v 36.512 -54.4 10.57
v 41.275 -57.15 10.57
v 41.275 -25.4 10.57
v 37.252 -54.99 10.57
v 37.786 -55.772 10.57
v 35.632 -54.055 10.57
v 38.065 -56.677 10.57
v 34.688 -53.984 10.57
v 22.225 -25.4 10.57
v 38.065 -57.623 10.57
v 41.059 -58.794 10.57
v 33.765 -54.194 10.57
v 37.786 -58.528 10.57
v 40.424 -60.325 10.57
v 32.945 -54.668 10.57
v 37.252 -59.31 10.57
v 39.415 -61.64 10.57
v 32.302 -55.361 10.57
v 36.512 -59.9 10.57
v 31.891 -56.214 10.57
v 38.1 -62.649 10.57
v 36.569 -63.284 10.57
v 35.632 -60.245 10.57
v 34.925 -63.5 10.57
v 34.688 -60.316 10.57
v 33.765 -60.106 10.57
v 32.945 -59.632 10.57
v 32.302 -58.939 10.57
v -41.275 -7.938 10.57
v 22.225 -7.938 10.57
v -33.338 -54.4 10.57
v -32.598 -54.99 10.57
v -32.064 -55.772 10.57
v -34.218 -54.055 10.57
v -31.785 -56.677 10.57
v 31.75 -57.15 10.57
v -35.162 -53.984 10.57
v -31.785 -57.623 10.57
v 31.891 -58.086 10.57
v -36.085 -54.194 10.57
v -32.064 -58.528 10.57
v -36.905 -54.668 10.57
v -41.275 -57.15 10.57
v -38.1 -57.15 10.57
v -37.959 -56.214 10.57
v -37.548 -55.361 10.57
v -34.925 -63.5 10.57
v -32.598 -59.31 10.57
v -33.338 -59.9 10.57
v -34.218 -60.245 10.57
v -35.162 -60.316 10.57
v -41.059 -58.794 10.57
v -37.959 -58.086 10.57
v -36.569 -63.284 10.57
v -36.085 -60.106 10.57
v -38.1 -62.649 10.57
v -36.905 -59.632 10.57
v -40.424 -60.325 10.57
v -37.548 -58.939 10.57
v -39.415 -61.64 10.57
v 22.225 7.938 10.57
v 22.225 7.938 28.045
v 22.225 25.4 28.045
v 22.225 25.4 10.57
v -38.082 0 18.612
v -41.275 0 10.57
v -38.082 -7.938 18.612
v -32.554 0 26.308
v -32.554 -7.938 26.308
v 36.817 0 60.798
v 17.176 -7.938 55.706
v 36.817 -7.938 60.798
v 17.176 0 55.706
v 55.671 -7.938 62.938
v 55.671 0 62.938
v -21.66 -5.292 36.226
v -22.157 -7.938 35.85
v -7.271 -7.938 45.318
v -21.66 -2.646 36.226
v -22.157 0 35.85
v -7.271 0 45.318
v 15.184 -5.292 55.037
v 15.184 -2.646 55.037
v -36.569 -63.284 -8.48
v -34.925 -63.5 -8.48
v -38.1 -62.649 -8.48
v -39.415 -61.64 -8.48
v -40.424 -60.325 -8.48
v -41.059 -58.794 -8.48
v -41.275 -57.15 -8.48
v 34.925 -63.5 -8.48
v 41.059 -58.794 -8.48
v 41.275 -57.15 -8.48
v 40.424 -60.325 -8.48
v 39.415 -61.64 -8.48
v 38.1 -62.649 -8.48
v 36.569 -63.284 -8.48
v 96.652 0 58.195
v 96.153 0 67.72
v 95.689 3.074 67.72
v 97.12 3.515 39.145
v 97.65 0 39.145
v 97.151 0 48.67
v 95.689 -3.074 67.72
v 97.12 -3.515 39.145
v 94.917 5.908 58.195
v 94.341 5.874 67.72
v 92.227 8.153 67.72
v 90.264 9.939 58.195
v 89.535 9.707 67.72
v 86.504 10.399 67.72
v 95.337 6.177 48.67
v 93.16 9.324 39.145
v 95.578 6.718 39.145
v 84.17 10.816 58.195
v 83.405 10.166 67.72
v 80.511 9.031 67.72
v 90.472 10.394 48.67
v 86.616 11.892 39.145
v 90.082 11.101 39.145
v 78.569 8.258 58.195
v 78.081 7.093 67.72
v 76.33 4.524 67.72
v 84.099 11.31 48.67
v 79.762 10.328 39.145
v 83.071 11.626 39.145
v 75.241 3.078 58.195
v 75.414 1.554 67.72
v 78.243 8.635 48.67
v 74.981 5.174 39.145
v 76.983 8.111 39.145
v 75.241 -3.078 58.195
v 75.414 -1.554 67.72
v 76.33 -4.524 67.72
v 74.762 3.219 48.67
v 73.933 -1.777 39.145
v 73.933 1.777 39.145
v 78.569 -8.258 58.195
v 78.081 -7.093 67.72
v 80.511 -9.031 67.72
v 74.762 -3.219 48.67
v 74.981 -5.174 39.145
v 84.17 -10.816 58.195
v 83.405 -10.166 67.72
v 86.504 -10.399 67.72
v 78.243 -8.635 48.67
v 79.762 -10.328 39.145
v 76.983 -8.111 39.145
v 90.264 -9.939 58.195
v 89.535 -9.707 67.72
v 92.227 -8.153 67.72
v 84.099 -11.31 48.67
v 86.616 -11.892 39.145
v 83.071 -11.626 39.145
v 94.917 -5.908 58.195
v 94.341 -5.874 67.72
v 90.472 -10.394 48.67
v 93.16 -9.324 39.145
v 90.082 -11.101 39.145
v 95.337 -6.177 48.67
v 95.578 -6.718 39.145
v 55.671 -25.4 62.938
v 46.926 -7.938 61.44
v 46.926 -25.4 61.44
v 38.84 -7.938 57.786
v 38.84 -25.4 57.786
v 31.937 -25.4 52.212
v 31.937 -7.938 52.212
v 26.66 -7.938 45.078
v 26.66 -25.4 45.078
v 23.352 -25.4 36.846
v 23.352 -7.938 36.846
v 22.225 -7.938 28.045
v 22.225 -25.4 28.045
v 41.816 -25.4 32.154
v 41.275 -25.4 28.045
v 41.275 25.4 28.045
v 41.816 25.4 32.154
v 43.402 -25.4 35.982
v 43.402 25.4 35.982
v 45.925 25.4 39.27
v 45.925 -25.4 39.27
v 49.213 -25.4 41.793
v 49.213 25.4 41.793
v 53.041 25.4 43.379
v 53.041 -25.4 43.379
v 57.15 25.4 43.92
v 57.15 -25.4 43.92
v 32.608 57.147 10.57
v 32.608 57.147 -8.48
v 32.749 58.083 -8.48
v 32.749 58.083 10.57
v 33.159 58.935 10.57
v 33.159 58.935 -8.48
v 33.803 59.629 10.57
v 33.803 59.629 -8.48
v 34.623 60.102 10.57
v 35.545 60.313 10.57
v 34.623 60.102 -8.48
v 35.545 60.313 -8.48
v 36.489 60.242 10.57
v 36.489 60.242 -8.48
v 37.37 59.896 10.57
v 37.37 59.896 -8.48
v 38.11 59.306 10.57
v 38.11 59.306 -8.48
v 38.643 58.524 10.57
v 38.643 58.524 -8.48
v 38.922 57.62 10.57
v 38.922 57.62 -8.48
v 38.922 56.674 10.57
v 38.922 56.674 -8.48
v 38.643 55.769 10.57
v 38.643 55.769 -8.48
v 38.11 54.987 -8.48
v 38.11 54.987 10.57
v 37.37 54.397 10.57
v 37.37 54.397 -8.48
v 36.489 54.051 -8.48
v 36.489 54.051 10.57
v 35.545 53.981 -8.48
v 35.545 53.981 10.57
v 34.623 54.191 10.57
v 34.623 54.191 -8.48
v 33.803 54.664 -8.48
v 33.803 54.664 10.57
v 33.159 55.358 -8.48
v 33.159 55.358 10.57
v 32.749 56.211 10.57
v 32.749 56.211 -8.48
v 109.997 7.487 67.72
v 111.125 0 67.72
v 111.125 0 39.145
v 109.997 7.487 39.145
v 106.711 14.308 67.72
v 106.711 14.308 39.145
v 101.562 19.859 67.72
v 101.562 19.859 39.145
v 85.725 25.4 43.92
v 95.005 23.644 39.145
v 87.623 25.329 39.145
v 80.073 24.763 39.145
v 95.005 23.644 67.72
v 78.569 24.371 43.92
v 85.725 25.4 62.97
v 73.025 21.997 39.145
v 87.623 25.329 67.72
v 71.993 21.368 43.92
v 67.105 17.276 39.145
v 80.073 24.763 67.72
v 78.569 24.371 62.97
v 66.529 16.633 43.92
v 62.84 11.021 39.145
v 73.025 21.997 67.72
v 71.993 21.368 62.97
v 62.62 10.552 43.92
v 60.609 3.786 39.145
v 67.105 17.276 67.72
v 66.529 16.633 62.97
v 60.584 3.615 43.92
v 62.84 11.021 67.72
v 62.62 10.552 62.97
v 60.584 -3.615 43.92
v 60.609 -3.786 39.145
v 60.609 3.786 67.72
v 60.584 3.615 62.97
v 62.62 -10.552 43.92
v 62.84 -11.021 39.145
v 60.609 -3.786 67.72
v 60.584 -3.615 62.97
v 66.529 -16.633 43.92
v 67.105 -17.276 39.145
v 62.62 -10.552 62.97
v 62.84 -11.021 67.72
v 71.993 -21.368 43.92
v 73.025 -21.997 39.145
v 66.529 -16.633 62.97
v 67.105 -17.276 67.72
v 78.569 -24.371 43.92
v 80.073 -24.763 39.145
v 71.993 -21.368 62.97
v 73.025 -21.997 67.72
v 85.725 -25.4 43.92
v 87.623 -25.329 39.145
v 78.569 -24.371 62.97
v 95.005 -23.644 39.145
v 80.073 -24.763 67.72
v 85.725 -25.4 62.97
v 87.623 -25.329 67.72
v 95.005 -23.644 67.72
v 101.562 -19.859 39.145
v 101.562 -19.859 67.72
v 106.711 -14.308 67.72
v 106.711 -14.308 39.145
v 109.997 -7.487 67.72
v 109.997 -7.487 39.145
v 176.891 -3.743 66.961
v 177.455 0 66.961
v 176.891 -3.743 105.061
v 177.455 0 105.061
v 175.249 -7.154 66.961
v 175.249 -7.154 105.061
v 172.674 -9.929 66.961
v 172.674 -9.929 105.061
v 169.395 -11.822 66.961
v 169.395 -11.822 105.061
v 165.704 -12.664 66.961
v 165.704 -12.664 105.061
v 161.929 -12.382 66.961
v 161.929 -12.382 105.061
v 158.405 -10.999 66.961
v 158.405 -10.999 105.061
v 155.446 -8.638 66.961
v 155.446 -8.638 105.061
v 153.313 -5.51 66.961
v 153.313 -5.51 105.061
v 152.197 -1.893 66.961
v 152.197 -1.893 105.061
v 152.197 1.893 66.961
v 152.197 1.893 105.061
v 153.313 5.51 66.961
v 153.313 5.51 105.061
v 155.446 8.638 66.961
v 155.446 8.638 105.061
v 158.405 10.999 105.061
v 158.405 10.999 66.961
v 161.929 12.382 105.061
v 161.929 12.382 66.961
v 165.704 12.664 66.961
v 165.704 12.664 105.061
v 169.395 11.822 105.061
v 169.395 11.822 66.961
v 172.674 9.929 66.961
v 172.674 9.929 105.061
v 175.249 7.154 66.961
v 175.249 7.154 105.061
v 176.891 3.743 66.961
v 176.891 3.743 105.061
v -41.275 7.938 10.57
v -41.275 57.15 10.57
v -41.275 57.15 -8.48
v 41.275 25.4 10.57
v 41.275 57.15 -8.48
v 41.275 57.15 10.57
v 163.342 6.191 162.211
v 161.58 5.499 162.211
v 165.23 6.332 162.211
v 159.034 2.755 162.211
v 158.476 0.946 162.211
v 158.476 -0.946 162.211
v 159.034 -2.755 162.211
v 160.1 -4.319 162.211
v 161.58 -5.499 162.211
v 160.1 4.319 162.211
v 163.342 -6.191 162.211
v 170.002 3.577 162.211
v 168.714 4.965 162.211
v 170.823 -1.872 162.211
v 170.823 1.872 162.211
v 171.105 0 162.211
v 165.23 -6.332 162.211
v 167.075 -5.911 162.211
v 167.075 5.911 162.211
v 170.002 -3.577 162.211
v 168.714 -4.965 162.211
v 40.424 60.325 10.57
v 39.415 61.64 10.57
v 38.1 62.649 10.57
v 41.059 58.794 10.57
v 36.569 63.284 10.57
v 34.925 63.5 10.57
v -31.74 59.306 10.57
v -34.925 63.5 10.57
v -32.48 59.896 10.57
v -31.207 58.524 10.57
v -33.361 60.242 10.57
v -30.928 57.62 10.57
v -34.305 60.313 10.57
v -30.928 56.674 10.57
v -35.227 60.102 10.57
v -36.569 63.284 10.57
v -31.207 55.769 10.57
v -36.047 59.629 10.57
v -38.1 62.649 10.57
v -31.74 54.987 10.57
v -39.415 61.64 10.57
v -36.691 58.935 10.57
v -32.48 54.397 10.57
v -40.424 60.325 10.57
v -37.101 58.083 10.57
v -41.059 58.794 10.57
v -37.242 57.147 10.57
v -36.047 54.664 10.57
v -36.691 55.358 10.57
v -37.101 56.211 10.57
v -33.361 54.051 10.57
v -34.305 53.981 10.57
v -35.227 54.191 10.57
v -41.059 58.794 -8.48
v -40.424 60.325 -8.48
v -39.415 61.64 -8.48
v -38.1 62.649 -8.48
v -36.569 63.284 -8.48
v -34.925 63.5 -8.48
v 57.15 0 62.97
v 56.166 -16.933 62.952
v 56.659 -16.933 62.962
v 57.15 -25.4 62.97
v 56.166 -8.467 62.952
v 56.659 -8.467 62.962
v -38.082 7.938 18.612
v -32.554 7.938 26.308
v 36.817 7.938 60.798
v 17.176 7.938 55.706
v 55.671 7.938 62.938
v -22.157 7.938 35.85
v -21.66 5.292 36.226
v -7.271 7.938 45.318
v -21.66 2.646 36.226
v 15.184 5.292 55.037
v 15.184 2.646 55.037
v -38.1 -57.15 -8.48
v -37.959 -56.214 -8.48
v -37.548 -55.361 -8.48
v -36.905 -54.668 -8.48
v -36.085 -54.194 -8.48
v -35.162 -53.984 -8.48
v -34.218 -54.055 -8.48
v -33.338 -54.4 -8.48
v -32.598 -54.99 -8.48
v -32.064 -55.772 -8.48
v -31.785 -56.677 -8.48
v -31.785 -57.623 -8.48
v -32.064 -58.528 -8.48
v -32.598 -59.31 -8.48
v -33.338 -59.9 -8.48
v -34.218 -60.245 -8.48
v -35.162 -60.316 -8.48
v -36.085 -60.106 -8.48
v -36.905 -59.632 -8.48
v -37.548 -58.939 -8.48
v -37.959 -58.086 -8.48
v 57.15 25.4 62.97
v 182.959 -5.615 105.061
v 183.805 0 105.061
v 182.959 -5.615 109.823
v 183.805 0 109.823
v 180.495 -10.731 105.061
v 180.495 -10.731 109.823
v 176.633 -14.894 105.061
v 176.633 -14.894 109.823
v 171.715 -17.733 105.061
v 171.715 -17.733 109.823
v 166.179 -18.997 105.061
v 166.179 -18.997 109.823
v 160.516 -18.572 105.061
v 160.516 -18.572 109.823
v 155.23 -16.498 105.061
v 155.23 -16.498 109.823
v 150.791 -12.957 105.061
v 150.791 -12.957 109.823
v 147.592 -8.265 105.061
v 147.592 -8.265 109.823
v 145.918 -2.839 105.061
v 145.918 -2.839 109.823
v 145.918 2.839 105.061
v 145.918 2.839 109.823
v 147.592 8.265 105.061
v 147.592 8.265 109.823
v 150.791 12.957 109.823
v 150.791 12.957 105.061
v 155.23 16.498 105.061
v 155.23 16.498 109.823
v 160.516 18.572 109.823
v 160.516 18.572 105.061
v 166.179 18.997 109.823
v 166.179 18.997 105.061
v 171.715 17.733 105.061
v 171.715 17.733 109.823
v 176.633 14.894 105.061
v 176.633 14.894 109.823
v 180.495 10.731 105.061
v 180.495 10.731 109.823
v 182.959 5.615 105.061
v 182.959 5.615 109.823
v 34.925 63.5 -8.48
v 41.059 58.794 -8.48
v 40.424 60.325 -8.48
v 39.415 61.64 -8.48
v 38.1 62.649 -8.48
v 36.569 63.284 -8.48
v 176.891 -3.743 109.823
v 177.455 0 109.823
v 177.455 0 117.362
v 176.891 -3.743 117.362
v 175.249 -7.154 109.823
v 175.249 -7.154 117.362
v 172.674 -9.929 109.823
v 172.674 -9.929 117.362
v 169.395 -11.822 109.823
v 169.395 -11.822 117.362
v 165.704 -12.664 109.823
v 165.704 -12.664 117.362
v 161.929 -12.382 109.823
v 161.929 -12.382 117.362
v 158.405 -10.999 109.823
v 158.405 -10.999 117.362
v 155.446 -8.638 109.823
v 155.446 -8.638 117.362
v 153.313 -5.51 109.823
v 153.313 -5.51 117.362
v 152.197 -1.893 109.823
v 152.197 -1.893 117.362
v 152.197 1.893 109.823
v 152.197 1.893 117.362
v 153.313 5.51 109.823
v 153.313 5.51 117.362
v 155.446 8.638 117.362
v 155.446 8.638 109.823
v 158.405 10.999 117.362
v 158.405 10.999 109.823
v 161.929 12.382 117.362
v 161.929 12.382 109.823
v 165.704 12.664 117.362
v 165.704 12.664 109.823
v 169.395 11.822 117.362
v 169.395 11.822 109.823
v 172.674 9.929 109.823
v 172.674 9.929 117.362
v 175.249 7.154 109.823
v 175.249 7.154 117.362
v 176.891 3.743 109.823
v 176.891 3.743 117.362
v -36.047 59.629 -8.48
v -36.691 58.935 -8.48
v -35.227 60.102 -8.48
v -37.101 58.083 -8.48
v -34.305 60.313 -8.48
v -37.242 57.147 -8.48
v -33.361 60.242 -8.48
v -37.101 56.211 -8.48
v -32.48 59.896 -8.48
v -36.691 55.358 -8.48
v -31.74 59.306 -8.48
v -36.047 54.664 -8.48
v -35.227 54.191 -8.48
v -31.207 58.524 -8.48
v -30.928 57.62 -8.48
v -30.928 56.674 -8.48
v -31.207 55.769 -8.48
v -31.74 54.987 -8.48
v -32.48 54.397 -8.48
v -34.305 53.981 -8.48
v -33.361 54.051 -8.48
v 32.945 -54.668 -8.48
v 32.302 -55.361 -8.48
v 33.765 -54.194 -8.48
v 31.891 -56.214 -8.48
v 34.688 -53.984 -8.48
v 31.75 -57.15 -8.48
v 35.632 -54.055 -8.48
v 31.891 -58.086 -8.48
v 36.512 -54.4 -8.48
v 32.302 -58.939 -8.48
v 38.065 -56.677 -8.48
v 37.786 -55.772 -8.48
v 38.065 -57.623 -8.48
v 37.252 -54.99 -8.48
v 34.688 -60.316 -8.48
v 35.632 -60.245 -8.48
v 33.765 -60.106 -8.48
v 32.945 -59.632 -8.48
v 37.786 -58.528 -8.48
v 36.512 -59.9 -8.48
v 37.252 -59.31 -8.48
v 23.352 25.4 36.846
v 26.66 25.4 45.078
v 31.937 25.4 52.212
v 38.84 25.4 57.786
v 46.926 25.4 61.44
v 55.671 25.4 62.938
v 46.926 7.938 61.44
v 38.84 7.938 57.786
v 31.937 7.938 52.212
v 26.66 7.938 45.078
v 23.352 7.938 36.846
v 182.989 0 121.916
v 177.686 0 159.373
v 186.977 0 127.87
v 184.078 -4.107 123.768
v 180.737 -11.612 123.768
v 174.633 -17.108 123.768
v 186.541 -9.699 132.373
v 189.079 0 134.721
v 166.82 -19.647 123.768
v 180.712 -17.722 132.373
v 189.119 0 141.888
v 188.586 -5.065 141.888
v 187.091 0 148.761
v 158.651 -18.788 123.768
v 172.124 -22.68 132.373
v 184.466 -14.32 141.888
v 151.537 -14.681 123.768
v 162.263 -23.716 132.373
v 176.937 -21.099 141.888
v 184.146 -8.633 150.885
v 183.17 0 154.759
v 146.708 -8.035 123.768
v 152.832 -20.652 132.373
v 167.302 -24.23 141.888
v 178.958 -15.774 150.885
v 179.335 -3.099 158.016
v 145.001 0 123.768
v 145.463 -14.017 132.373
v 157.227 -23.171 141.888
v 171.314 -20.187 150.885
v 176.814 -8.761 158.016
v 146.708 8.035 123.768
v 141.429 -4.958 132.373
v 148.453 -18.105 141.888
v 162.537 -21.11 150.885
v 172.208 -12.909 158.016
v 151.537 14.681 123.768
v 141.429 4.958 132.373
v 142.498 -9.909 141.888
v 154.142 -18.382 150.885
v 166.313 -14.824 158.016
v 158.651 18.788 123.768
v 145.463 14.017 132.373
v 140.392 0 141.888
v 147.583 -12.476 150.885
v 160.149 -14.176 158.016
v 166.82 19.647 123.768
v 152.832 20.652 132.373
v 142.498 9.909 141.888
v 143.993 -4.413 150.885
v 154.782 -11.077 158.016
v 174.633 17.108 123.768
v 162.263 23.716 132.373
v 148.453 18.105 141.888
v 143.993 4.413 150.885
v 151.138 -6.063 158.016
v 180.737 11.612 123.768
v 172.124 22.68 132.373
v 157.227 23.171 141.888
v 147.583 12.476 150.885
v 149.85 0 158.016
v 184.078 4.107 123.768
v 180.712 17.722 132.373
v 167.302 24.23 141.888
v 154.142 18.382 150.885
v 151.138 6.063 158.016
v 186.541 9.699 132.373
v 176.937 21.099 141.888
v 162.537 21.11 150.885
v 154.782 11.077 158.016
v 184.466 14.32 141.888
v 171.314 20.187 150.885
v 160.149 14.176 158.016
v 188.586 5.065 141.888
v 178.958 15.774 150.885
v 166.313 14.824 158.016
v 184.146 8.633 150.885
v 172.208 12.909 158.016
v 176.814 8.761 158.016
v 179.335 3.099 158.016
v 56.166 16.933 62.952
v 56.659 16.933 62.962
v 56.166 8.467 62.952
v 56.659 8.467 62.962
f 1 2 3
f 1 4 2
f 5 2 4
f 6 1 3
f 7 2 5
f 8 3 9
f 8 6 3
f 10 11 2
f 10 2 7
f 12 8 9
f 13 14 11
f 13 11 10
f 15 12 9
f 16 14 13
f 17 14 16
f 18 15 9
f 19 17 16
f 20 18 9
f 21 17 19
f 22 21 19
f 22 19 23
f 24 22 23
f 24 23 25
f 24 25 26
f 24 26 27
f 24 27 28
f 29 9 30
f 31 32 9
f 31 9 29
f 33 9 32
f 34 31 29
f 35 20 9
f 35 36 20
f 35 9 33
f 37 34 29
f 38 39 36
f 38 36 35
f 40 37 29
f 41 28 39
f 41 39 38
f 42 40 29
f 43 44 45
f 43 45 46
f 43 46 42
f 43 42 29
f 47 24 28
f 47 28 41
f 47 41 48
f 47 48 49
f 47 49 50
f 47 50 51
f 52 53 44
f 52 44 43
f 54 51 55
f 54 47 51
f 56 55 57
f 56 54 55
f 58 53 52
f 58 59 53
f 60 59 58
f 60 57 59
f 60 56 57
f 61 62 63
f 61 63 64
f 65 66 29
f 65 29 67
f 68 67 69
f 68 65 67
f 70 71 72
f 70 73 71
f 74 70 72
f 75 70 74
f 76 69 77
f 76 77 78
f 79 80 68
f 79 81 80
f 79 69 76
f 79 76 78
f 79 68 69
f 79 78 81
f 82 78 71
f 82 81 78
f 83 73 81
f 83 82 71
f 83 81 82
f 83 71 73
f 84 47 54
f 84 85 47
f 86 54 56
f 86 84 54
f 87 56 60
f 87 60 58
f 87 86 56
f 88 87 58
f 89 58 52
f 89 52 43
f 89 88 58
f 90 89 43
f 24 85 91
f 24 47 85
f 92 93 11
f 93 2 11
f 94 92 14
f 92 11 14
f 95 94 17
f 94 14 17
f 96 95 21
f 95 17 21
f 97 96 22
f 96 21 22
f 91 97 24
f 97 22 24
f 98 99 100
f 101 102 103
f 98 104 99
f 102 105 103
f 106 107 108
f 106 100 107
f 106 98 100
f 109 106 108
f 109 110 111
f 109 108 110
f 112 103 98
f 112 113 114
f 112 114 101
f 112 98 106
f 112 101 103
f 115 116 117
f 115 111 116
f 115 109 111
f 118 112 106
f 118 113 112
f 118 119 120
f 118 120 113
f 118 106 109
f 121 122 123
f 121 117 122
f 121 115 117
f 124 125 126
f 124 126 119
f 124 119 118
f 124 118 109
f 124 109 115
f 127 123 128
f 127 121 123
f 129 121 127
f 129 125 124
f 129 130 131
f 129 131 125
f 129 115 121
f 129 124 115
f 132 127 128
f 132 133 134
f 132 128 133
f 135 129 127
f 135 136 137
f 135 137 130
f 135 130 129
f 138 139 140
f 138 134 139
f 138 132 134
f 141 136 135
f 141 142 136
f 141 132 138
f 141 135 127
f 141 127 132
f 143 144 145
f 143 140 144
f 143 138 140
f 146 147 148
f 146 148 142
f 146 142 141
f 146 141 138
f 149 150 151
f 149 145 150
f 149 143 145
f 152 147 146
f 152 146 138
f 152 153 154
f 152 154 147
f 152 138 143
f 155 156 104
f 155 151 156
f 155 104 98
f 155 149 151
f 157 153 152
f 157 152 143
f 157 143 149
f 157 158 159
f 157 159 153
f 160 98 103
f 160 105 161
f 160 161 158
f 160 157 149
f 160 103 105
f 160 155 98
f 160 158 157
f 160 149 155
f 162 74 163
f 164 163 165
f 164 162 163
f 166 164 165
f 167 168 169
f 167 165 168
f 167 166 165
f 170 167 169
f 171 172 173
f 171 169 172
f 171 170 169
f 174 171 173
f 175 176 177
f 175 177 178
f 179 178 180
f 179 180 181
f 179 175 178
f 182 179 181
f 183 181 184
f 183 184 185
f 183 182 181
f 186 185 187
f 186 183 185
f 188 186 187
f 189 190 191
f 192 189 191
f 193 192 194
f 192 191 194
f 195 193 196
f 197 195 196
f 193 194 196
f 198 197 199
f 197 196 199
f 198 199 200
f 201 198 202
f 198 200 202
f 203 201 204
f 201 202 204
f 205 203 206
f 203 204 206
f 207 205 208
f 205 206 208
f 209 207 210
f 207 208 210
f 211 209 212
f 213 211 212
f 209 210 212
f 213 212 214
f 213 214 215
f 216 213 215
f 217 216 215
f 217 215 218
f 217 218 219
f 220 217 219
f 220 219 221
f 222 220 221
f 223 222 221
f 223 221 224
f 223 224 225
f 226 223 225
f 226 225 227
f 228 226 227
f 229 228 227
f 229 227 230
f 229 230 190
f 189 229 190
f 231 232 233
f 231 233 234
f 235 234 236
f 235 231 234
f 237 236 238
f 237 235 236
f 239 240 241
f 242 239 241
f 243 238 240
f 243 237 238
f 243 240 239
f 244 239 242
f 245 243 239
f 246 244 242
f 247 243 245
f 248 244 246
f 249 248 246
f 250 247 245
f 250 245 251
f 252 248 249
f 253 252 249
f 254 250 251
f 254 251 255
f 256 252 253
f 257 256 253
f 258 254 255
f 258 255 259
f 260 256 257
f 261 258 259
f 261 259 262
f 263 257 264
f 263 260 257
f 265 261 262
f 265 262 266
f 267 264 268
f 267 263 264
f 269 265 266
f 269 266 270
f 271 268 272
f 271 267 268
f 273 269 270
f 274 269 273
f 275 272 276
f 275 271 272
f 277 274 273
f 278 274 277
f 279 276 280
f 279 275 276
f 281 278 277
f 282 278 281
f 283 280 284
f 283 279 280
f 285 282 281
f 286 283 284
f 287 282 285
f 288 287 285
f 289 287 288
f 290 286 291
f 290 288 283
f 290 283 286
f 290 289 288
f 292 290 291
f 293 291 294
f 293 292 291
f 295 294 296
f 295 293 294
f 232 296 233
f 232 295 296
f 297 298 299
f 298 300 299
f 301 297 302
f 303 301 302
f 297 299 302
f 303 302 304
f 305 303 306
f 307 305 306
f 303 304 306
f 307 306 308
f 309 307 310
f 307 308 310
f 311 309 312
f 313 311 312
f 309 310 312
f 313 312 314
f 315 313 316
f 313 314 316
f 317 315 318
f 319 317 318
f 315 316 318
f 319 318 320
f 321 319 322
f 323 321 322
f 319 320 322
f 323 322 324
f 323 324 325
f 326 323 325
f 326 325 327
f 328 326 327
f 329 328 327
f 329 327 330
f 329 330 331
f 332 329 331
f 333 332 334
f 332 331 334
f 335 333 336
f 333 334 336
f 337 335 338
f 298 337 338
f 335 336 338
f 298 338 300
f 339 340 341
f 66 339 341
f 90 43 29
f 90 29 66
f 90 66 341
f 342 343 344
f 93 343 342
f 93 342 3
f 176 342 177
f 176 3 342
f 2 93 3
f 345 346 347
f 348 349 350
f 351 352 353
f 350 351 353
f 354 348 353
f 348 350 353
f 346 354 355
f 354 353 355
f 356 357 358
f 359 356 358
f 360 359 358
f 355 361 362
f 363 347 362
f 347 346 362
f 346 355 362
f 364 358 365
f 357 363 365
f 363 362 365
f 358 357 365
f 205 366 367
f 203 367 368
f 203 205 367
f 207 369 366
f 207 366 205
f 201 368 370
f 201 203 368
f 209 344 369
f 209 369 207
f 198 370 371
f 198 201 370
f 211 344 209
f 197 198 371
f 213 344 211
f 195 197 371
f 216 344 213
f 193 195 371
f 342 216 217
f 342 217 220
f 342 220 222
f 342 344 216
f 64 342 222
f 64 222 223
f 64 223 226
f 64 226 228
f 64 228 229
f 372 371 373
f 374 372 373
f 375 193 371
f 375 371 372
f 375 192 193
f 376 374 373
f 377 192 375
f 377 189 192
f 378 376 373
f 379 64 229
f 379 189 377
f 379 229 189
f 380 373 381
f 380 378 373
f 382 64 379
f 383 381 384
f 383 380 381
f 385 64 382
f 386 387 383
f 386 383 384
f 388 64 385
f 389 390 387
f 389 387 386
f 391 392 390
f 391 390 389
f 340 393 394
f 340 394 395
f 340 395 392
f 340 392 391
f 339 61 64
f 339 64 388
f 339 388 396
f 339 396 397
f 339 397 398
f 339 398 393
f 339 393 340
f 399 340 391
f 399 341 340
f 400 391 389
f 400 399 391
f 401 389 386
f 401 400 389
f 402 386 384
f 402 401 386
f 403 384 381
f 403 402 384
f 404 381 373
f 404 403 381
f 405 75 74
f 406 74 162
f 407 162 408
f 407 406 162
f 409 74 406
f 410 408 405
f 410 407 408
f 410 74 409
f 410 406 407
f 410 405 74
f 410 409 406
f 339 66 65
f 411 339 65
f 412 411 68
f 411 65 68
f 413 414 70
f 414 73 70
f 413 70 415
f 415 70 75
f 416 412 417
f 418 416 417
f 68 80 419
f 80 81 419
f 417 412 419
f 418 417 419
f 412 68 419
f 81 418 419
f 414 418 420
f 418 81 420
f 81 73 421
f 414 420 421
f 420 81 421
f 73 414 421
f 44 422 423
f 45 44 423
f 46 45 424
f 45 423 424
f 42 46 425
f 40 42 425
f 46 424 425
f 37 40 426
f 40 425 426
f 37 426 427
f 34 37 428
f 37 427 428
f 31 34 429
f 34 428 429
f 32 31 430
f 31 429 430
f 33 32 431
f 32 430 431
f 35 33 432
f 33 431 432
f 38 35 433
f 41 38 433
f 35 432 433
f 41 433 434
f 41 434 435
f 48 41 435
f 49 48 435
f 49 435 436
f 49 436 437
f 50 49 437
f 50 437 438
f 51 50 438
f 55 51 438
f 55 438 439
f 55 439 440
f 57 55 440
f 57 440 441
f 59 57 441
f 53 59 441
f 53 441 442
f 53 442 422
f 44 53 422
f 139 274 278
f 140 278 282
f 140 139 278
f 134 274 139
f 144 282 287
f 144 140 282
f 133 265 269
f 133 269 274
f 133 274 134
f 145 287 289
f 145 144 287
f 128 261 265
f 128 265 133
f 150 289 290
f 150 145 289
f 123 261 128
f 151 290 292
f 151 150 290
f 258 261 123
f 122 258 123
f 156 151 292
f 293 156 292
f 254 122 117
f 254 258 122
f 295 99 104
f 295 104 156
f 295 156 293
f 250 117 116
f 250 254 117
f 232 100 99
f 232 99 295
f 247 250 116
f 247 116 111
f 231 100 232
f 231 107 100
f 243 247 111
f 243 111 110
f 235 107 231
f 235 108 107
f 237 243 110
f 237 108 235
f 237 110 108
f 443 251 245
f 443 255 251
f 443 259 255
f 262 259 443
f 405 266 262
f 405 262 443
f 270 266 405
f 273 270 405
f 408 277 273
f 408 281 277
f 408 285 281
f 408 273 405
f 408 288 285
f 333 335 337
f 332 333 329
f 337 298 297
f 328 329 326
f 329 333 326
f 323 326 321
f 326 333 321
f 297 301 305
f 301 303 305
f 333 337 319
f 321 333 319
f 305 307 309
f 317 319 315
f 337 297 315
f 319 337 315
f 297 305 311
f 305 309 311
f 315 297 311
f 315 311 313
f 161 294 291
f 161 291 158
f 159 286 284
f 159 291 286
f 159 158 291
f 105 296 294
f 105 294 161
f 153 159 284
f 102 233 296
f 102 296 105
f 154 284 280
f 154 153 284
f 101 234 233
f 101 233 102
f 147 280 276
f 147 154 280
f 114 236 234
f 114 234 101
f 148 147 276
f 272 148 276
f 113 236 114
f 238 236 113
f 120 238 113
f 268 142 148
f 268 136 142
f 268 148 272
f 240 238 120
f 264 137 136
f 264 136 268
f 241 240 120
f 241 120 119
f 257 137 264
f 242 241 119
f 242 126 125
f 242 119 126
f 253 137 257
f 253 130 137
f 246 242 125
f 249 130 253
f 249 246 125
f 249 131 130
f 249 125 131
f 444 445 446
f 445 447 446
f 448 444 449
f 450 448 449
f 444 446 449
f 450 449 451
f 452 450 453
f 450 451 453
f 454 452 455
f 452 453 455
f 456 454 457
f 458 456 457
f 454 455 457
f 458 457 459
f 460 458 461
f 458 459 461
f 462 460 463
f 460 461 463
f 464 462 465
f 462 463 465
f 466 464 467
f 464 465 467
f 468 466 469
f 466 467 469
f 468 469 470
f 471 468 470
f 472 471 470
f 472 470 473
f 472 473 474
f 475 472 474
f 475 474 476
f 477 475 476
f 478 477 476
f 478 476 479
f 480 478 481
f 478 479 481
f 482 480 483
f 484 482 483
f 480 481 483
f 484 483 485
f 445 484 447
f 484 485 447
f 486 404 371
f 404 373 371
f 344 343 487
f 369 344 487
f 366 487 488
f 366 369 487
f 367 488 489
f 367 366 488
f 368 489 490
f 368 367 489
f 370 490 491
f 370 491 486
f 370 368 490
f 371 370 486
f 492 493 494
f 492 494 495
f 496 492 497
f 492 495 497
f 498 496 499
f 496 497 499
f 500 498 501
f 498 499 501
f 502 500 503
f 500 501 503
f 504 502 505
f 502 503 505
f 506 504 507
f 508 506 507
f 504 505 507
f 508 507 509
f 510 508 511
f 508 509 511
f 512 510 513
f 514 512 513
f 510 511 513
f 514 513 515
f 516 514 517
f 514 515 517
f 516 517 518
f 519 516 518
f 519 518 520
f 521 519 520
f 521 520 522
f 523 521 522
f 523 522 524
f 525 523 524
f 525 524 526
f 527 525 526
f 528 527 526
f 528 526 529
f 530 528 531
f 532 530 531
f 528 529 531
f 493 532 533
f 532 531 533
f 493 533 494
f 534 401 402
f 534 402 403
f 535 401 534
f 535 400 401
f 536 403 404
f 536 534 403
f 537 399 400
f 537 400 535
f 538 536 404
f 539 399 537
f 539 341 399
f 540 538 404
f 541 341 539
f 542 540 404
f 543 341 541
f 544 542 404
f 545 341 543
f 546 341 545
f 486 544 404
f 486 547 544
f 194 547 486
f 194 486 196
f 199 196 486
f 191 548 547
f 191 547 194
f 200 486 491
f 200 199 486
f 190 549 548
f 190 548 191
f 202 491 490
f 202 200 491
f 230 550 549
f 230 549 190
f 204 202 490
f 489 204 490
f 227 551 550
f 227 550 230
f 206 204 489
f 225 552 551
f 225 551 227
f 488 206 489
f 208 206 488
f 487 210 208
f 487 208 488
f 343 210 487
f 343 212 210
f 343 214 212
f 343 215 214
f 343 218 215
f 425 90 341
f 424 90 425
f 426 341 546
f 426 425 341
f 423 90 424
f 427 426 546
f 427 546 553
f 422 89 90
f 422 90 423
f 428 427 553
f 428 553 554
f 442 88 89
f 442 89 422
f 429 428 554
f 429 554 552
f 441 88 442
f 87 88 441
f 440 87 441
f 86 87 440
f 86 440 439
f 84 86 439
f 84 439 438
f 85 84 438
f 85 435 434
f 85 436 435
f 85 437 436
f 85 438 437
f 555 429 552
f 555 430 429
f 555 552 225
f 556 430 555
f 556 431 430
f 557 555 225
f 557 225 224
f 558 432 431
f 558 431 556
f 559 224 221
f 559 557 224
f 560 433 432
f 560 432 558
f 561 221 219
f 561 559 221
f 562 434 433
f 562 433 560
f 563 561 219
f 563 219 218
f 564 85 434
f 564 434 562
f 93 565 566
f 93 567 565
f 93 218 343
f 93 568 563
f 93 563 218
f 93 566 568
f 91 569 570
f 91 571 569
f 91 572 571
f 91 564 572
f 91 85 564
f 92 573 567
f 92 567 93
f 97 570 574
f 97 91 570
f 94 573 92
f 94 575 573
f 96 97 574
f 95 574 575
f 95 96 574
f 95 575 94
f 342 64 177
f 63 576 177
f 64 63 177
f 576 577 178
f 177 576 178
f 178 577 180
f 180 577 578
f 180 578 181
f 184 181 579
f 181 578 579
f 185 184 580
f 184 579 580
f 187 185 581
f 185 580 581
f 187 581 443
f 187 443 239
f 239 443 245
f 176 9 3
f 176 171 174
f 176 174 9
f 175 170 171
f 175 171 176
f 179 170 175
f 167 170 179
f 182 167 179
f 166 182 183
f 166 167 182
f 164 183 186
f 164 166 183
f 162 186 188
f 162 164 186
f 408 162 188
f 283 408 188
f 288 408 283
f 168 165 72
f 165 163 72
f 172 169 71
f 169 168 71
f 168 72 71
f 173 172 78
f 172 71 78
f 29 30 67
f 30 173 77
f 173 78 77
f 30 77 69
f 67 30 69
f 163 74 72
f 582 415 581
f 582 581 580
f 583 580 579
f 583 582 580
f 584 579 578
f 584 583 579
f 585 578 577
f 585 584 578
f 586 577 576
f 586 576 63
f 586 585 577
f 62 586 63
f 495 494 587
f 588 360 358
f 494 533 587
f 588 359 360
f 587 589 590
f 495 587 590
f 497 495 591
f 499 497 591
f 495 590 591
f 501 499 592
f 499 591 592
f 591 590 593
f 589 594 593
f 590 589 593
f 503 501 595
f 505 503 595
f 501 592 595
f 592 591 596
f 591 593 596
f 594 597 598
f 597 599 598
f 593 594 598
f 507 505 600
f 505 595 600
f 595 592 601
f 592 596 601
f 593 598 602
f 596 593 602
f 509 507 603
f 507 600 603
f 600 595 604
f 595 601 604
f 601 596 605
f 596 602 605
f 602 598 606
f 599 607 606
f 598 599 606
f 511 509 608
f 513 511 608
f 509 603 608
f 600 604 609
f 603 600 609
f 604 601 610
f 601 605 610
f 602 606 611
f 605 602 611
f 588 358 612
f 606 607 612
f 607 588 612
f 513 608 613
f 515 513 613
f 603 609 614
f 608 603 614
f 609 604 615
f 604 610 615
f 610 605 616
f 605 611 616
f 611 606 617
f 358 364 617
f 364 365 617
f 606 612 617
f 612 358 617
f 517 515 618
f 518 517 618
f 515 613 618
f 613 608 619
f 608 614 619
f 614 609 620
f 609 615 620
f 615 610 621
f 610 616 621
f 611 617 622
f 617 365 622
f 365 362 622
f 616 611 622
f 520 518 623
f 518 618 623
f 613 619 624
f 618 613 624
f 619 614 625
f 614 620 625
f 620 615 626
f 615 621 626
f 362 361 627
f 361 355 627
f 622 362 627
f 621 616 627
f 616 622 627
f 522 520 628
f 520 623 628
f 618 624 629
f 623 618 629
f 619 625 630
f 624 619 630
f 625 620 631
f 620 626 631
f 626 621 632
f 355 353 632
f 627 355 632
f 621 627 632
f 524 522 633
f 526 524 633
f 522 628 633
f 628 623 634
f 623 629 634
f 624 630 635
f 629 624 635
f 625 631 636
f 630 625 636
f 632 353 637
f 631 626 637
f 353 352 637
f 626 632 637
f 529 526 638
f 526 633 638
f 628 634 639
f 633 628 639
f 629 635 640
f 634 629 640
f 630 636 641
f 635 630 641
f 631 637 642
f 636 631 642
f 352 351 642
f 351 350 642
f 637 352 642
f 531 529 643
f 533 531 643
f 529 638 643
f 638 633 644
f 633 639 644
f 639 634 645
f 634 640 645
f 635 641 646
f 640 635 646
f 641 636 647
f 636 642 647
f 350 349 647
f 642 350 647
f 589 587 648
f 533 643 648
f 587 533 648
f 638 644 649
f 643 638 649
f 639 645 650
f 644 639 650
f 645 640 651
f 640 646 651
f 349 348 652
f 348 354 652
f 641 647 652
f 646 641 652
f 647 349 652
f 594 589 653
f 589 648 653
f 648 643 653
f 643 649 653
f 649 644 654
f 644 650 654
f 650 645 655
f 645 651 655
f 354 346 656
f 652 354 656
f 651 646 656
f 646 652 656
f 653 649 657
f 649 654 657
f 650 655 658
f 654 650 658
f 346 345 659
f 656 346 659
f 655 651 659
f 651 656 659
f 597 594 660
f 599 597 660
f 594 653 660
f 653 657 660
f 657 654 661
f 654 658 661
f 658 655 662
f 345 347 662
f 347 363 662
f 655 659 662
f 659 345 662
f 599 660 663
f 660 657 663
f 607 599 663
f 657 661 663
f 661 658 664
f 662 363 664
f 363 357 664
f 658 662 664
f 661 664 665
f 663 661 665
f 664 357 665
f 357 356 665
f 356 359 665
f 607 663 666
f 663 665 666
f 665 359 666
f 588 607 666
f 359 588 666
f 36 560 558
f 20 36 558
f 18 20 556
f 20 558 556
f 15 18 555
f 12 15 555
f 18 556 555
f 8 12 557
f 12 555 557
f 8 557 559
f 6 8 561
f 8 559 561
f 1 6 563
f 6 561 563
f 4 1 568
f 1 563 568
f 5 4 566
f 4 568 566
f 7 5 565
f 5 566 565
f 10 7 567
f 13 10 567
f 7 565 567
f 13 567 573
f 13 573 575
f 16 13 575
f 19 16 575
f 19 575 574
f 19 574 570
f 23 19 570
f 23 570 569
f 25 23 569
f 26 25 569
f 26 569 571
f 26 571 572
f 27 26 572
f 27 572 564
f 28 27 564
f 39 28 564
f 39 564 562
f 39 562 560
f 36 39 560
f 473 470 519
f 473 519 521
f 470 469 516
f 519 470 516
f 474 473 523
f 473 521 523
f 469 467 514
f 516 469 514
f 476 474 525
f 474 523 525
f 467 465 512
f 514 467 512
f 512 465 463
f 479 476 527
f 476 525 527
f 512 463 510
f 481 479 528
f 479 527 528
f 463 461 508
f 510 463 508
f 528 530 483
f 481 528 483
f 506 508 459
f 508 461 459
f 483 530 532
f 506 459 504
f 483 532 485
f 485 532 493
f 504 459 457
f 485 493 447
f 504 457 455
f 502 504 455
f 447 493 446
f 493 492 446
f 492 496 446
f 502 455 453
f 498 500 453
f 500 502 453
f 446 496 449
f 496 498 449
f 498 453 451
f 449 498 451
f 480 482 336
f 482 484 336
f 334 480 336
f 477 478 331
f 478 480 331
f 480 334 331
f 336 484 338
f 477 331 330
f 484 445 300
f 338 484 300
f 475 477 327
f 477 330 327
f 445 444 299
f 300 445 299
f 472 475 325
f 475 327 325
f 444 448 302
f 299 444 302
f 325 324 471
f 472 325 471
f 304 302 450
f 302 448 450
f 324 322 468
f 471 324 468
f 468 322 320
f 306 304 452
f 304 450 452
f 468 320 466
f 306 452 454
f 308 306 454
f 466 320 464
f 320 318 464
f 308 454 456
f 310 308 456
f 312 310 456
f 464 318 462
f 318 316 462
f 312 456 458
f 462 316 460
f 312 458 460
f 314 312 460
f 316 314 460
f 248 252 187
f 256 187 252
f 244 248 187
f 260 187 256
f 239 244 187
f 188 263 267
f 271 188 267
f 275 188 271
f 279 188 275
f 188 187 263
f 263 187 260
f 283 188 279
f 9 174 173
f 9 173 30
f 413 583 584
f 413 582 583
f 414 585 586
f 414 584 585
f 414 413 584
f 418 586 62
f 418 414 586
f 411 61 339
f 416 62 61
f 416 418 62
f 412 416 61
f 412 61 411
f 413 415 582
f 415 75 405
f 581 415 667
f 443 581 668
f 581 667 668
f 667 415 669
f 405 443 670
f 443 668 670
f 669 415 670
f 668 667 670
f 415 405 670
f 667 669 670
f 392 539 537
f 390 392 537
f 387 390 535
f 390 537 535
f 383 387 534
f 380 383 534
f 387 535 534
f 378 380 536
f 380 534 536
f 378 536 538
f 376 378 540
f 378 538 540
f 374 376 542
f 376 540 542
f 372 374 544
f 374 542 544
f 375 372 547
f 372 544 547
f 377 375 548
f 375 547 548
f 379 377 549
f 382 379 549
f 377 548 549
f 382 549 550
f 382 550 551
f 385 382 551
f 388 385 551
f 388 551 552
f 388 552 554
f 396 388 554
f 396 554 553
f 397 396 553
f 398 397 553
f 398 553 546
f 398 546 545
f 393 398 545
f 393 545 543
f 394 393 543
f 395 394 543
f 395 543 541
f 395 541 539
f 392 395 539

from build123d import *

# Parameters (mm, degrees)
F1_DEPTH = 63.5
F0_W     = 25.4
F0_H     = 19.05
F2_DEPTH = 25.4
F3_DEPTH = 7.9375
F5_R     = 6.35
F6_R     = 10.4277026359
F7_DEPTH = 76.201
F7_TAPER = -3
F9_D     = 6.35


with BuildPart() as f1:
    # F0 (on Front) → F1 (new body, symmetric)
    with BuildSketch(Plane.XZ):
        Polygon((-41.275, -8.4803864146), (41.275, -8.4803864146), (41.275, 10.5696135854), (22.225, 10.5696135854), (-41.275, 10.5696135854), align=None)
    extrude(amount=F1_DEPTH, both=True)

    # F0 (on Front) → F2 (join, symmetric)
    with BuildSketch(Plane.XZ):
        with BuildLine():
            Line((22.225, 10.5696135854), (41.275, 10.5696135854))
            Line((41.275, 10.5696135854), (41.275, 28.0448135854))
            ThreePointArc((41.275, 28.0448135854), (45.9246798487, 39.2701337367), (57.15, 43.9198135854))
            Line((57.15, 43.9198135854), (60.325, 43.9198135854))
            Line((60.325, 43.9198135854), (60.325, 62.9698135854))
            Line((60.325, 62.9698135854), (57.15, 62.9698135854))
            add(Edge.make_bspline(
                [(55.670826569, 62.9384759177), (56.1664980149, 62.9528020829), (56.6596018531, 62.963261742), (57.15, 62.9698135854)],
                knots=[110.0605103046, 110.0605103046, 110.0605103046, 110.0605103046, 111.5045361635, 111.5045361635, 111.5045361635, 111.5045361635], degree=3))
            ThreePointArc((55.670826569, 62.9384759177), (31.936751924, 52.2118933937), (22.225, 28.0448135854))
            Line((22.225, 28.0448135854), (22.225, 10.5696135854))
        make_face()
        with Locations((73.025, 53.4448135854)):
            Rectangle(F0_W, F0_H)
    extrude(amount=F2_DEPTH, both=True)

    # F0 (on Front) → F3 (join, symmetric)
    with BuildSketch(Plane.XZ):
        with BuildLine():
            add(Edge.make_bspline(
                [(-41.275, 10.5696135854), (-34.8028083987, 38.2935172536), (17.8918270147, 61.8465667659), (55.670826569, 62.9384759177)],
                knots=[0, 0, 0, 0, 110.0605103046, 110.0605103046, 110.0605103046, 110.0605103046], degree=3))
            Line((-41.275, 10.5696135854), (22.225, 10.5696135854))
            Line((22.225, 10.5696135854), (22.225, 28.0448135854))
            ThreePointArc((22.225, 28.0448135854), (31.936751924, 52.2118933937), (55.670826569, 62.9384759177))
        make_face()
    extrude(amount=F3_DEPTH, both=True)

    # F0 (on Front) → F4 (revolve)
    with BuildSketch(Plane.XZ):
        Polygon((85.725, 62.9698135854), (85.725, 43.9198135854), (85.725, 39.1446135854), (111.125, 39.1446135854), (111.125, 67.7196135854), (85.725, 67.7196135854), align=None)
    revolve(axis=Axis((85.725, 0, 53.4321135854), (0, 0, 1)))

    # F5
    f5_edges = [f1.edges().sort_by_distance(p)[0] for p in [
        (-41.275, -63.5, 1.044614),
        (41.275, -63.5, 1.044614),
        (41.275, 63.5, 1.044614),
        (-41.275, 63.5, 1.044614),
    ]]
    fillet(f5_edges, radius=F5_R)

    # F6 (on face) → F7 (cut, through all)
    with BuildSketch(Plane.XY.offset(67.7196135854)):
        with Locations((85.725, 0)):
            Circle(F6_R)
    extrude(amount=-F7_DEPTH, taper=F7_TAPER, mode=Mode.SUBTRACT)

    # F9 (through all)
    with Locations(Plane.XY.offset(10.5696135854)):
        with Locations((34.9249977589, -57.15), (-34.925, -57.15), (35.7827192911, 57.146779417), (-34.0672784677, 57.146779417)):
            Hole(F9_D / 2)


with BuildPart() as f11:
    # F10 (on Front) → F11 (revolve)
    with BuildSketch(Plane.XZ):
        with BuildLine():
            Line((164.7552926287, 162.2107950438), (164.7552926287, 66.9607950438))
            Line((164.7552926287, 66.9607950438), (177.4552926287, 66.9607950438))
            Line((177.4552926287, 66.9607950438), (177.4552926287, 105.0607950438))
            Line((177.4552926287, 105.0607950438), (183.8052926287, 105.0607950438))
            Line((183.8052926287, 105.0607950438), (183.8052926287, 109.8232950438))
            Line((183.8052926287, 109.8232950438), (177.4552926287, 109.8232950438))
            Line((177.4552926287, 109.8232950438), (177.4552926287, 117.3624957718))
            ThreePointArc((177.4552926287, 117.3624957718), (189.1185459397, 141.8875703048), (171.1052926287, 162.2107950438))
            Line((171.1052926287, 162.2107950438), (164.7552926287, 162.2107950438))
        make_face()
    revolve(axis=Axis((164.7552926287, 0, 114.5857950438), (0, 0, -1)))


solid = Compound([f1.part, f11.part])
